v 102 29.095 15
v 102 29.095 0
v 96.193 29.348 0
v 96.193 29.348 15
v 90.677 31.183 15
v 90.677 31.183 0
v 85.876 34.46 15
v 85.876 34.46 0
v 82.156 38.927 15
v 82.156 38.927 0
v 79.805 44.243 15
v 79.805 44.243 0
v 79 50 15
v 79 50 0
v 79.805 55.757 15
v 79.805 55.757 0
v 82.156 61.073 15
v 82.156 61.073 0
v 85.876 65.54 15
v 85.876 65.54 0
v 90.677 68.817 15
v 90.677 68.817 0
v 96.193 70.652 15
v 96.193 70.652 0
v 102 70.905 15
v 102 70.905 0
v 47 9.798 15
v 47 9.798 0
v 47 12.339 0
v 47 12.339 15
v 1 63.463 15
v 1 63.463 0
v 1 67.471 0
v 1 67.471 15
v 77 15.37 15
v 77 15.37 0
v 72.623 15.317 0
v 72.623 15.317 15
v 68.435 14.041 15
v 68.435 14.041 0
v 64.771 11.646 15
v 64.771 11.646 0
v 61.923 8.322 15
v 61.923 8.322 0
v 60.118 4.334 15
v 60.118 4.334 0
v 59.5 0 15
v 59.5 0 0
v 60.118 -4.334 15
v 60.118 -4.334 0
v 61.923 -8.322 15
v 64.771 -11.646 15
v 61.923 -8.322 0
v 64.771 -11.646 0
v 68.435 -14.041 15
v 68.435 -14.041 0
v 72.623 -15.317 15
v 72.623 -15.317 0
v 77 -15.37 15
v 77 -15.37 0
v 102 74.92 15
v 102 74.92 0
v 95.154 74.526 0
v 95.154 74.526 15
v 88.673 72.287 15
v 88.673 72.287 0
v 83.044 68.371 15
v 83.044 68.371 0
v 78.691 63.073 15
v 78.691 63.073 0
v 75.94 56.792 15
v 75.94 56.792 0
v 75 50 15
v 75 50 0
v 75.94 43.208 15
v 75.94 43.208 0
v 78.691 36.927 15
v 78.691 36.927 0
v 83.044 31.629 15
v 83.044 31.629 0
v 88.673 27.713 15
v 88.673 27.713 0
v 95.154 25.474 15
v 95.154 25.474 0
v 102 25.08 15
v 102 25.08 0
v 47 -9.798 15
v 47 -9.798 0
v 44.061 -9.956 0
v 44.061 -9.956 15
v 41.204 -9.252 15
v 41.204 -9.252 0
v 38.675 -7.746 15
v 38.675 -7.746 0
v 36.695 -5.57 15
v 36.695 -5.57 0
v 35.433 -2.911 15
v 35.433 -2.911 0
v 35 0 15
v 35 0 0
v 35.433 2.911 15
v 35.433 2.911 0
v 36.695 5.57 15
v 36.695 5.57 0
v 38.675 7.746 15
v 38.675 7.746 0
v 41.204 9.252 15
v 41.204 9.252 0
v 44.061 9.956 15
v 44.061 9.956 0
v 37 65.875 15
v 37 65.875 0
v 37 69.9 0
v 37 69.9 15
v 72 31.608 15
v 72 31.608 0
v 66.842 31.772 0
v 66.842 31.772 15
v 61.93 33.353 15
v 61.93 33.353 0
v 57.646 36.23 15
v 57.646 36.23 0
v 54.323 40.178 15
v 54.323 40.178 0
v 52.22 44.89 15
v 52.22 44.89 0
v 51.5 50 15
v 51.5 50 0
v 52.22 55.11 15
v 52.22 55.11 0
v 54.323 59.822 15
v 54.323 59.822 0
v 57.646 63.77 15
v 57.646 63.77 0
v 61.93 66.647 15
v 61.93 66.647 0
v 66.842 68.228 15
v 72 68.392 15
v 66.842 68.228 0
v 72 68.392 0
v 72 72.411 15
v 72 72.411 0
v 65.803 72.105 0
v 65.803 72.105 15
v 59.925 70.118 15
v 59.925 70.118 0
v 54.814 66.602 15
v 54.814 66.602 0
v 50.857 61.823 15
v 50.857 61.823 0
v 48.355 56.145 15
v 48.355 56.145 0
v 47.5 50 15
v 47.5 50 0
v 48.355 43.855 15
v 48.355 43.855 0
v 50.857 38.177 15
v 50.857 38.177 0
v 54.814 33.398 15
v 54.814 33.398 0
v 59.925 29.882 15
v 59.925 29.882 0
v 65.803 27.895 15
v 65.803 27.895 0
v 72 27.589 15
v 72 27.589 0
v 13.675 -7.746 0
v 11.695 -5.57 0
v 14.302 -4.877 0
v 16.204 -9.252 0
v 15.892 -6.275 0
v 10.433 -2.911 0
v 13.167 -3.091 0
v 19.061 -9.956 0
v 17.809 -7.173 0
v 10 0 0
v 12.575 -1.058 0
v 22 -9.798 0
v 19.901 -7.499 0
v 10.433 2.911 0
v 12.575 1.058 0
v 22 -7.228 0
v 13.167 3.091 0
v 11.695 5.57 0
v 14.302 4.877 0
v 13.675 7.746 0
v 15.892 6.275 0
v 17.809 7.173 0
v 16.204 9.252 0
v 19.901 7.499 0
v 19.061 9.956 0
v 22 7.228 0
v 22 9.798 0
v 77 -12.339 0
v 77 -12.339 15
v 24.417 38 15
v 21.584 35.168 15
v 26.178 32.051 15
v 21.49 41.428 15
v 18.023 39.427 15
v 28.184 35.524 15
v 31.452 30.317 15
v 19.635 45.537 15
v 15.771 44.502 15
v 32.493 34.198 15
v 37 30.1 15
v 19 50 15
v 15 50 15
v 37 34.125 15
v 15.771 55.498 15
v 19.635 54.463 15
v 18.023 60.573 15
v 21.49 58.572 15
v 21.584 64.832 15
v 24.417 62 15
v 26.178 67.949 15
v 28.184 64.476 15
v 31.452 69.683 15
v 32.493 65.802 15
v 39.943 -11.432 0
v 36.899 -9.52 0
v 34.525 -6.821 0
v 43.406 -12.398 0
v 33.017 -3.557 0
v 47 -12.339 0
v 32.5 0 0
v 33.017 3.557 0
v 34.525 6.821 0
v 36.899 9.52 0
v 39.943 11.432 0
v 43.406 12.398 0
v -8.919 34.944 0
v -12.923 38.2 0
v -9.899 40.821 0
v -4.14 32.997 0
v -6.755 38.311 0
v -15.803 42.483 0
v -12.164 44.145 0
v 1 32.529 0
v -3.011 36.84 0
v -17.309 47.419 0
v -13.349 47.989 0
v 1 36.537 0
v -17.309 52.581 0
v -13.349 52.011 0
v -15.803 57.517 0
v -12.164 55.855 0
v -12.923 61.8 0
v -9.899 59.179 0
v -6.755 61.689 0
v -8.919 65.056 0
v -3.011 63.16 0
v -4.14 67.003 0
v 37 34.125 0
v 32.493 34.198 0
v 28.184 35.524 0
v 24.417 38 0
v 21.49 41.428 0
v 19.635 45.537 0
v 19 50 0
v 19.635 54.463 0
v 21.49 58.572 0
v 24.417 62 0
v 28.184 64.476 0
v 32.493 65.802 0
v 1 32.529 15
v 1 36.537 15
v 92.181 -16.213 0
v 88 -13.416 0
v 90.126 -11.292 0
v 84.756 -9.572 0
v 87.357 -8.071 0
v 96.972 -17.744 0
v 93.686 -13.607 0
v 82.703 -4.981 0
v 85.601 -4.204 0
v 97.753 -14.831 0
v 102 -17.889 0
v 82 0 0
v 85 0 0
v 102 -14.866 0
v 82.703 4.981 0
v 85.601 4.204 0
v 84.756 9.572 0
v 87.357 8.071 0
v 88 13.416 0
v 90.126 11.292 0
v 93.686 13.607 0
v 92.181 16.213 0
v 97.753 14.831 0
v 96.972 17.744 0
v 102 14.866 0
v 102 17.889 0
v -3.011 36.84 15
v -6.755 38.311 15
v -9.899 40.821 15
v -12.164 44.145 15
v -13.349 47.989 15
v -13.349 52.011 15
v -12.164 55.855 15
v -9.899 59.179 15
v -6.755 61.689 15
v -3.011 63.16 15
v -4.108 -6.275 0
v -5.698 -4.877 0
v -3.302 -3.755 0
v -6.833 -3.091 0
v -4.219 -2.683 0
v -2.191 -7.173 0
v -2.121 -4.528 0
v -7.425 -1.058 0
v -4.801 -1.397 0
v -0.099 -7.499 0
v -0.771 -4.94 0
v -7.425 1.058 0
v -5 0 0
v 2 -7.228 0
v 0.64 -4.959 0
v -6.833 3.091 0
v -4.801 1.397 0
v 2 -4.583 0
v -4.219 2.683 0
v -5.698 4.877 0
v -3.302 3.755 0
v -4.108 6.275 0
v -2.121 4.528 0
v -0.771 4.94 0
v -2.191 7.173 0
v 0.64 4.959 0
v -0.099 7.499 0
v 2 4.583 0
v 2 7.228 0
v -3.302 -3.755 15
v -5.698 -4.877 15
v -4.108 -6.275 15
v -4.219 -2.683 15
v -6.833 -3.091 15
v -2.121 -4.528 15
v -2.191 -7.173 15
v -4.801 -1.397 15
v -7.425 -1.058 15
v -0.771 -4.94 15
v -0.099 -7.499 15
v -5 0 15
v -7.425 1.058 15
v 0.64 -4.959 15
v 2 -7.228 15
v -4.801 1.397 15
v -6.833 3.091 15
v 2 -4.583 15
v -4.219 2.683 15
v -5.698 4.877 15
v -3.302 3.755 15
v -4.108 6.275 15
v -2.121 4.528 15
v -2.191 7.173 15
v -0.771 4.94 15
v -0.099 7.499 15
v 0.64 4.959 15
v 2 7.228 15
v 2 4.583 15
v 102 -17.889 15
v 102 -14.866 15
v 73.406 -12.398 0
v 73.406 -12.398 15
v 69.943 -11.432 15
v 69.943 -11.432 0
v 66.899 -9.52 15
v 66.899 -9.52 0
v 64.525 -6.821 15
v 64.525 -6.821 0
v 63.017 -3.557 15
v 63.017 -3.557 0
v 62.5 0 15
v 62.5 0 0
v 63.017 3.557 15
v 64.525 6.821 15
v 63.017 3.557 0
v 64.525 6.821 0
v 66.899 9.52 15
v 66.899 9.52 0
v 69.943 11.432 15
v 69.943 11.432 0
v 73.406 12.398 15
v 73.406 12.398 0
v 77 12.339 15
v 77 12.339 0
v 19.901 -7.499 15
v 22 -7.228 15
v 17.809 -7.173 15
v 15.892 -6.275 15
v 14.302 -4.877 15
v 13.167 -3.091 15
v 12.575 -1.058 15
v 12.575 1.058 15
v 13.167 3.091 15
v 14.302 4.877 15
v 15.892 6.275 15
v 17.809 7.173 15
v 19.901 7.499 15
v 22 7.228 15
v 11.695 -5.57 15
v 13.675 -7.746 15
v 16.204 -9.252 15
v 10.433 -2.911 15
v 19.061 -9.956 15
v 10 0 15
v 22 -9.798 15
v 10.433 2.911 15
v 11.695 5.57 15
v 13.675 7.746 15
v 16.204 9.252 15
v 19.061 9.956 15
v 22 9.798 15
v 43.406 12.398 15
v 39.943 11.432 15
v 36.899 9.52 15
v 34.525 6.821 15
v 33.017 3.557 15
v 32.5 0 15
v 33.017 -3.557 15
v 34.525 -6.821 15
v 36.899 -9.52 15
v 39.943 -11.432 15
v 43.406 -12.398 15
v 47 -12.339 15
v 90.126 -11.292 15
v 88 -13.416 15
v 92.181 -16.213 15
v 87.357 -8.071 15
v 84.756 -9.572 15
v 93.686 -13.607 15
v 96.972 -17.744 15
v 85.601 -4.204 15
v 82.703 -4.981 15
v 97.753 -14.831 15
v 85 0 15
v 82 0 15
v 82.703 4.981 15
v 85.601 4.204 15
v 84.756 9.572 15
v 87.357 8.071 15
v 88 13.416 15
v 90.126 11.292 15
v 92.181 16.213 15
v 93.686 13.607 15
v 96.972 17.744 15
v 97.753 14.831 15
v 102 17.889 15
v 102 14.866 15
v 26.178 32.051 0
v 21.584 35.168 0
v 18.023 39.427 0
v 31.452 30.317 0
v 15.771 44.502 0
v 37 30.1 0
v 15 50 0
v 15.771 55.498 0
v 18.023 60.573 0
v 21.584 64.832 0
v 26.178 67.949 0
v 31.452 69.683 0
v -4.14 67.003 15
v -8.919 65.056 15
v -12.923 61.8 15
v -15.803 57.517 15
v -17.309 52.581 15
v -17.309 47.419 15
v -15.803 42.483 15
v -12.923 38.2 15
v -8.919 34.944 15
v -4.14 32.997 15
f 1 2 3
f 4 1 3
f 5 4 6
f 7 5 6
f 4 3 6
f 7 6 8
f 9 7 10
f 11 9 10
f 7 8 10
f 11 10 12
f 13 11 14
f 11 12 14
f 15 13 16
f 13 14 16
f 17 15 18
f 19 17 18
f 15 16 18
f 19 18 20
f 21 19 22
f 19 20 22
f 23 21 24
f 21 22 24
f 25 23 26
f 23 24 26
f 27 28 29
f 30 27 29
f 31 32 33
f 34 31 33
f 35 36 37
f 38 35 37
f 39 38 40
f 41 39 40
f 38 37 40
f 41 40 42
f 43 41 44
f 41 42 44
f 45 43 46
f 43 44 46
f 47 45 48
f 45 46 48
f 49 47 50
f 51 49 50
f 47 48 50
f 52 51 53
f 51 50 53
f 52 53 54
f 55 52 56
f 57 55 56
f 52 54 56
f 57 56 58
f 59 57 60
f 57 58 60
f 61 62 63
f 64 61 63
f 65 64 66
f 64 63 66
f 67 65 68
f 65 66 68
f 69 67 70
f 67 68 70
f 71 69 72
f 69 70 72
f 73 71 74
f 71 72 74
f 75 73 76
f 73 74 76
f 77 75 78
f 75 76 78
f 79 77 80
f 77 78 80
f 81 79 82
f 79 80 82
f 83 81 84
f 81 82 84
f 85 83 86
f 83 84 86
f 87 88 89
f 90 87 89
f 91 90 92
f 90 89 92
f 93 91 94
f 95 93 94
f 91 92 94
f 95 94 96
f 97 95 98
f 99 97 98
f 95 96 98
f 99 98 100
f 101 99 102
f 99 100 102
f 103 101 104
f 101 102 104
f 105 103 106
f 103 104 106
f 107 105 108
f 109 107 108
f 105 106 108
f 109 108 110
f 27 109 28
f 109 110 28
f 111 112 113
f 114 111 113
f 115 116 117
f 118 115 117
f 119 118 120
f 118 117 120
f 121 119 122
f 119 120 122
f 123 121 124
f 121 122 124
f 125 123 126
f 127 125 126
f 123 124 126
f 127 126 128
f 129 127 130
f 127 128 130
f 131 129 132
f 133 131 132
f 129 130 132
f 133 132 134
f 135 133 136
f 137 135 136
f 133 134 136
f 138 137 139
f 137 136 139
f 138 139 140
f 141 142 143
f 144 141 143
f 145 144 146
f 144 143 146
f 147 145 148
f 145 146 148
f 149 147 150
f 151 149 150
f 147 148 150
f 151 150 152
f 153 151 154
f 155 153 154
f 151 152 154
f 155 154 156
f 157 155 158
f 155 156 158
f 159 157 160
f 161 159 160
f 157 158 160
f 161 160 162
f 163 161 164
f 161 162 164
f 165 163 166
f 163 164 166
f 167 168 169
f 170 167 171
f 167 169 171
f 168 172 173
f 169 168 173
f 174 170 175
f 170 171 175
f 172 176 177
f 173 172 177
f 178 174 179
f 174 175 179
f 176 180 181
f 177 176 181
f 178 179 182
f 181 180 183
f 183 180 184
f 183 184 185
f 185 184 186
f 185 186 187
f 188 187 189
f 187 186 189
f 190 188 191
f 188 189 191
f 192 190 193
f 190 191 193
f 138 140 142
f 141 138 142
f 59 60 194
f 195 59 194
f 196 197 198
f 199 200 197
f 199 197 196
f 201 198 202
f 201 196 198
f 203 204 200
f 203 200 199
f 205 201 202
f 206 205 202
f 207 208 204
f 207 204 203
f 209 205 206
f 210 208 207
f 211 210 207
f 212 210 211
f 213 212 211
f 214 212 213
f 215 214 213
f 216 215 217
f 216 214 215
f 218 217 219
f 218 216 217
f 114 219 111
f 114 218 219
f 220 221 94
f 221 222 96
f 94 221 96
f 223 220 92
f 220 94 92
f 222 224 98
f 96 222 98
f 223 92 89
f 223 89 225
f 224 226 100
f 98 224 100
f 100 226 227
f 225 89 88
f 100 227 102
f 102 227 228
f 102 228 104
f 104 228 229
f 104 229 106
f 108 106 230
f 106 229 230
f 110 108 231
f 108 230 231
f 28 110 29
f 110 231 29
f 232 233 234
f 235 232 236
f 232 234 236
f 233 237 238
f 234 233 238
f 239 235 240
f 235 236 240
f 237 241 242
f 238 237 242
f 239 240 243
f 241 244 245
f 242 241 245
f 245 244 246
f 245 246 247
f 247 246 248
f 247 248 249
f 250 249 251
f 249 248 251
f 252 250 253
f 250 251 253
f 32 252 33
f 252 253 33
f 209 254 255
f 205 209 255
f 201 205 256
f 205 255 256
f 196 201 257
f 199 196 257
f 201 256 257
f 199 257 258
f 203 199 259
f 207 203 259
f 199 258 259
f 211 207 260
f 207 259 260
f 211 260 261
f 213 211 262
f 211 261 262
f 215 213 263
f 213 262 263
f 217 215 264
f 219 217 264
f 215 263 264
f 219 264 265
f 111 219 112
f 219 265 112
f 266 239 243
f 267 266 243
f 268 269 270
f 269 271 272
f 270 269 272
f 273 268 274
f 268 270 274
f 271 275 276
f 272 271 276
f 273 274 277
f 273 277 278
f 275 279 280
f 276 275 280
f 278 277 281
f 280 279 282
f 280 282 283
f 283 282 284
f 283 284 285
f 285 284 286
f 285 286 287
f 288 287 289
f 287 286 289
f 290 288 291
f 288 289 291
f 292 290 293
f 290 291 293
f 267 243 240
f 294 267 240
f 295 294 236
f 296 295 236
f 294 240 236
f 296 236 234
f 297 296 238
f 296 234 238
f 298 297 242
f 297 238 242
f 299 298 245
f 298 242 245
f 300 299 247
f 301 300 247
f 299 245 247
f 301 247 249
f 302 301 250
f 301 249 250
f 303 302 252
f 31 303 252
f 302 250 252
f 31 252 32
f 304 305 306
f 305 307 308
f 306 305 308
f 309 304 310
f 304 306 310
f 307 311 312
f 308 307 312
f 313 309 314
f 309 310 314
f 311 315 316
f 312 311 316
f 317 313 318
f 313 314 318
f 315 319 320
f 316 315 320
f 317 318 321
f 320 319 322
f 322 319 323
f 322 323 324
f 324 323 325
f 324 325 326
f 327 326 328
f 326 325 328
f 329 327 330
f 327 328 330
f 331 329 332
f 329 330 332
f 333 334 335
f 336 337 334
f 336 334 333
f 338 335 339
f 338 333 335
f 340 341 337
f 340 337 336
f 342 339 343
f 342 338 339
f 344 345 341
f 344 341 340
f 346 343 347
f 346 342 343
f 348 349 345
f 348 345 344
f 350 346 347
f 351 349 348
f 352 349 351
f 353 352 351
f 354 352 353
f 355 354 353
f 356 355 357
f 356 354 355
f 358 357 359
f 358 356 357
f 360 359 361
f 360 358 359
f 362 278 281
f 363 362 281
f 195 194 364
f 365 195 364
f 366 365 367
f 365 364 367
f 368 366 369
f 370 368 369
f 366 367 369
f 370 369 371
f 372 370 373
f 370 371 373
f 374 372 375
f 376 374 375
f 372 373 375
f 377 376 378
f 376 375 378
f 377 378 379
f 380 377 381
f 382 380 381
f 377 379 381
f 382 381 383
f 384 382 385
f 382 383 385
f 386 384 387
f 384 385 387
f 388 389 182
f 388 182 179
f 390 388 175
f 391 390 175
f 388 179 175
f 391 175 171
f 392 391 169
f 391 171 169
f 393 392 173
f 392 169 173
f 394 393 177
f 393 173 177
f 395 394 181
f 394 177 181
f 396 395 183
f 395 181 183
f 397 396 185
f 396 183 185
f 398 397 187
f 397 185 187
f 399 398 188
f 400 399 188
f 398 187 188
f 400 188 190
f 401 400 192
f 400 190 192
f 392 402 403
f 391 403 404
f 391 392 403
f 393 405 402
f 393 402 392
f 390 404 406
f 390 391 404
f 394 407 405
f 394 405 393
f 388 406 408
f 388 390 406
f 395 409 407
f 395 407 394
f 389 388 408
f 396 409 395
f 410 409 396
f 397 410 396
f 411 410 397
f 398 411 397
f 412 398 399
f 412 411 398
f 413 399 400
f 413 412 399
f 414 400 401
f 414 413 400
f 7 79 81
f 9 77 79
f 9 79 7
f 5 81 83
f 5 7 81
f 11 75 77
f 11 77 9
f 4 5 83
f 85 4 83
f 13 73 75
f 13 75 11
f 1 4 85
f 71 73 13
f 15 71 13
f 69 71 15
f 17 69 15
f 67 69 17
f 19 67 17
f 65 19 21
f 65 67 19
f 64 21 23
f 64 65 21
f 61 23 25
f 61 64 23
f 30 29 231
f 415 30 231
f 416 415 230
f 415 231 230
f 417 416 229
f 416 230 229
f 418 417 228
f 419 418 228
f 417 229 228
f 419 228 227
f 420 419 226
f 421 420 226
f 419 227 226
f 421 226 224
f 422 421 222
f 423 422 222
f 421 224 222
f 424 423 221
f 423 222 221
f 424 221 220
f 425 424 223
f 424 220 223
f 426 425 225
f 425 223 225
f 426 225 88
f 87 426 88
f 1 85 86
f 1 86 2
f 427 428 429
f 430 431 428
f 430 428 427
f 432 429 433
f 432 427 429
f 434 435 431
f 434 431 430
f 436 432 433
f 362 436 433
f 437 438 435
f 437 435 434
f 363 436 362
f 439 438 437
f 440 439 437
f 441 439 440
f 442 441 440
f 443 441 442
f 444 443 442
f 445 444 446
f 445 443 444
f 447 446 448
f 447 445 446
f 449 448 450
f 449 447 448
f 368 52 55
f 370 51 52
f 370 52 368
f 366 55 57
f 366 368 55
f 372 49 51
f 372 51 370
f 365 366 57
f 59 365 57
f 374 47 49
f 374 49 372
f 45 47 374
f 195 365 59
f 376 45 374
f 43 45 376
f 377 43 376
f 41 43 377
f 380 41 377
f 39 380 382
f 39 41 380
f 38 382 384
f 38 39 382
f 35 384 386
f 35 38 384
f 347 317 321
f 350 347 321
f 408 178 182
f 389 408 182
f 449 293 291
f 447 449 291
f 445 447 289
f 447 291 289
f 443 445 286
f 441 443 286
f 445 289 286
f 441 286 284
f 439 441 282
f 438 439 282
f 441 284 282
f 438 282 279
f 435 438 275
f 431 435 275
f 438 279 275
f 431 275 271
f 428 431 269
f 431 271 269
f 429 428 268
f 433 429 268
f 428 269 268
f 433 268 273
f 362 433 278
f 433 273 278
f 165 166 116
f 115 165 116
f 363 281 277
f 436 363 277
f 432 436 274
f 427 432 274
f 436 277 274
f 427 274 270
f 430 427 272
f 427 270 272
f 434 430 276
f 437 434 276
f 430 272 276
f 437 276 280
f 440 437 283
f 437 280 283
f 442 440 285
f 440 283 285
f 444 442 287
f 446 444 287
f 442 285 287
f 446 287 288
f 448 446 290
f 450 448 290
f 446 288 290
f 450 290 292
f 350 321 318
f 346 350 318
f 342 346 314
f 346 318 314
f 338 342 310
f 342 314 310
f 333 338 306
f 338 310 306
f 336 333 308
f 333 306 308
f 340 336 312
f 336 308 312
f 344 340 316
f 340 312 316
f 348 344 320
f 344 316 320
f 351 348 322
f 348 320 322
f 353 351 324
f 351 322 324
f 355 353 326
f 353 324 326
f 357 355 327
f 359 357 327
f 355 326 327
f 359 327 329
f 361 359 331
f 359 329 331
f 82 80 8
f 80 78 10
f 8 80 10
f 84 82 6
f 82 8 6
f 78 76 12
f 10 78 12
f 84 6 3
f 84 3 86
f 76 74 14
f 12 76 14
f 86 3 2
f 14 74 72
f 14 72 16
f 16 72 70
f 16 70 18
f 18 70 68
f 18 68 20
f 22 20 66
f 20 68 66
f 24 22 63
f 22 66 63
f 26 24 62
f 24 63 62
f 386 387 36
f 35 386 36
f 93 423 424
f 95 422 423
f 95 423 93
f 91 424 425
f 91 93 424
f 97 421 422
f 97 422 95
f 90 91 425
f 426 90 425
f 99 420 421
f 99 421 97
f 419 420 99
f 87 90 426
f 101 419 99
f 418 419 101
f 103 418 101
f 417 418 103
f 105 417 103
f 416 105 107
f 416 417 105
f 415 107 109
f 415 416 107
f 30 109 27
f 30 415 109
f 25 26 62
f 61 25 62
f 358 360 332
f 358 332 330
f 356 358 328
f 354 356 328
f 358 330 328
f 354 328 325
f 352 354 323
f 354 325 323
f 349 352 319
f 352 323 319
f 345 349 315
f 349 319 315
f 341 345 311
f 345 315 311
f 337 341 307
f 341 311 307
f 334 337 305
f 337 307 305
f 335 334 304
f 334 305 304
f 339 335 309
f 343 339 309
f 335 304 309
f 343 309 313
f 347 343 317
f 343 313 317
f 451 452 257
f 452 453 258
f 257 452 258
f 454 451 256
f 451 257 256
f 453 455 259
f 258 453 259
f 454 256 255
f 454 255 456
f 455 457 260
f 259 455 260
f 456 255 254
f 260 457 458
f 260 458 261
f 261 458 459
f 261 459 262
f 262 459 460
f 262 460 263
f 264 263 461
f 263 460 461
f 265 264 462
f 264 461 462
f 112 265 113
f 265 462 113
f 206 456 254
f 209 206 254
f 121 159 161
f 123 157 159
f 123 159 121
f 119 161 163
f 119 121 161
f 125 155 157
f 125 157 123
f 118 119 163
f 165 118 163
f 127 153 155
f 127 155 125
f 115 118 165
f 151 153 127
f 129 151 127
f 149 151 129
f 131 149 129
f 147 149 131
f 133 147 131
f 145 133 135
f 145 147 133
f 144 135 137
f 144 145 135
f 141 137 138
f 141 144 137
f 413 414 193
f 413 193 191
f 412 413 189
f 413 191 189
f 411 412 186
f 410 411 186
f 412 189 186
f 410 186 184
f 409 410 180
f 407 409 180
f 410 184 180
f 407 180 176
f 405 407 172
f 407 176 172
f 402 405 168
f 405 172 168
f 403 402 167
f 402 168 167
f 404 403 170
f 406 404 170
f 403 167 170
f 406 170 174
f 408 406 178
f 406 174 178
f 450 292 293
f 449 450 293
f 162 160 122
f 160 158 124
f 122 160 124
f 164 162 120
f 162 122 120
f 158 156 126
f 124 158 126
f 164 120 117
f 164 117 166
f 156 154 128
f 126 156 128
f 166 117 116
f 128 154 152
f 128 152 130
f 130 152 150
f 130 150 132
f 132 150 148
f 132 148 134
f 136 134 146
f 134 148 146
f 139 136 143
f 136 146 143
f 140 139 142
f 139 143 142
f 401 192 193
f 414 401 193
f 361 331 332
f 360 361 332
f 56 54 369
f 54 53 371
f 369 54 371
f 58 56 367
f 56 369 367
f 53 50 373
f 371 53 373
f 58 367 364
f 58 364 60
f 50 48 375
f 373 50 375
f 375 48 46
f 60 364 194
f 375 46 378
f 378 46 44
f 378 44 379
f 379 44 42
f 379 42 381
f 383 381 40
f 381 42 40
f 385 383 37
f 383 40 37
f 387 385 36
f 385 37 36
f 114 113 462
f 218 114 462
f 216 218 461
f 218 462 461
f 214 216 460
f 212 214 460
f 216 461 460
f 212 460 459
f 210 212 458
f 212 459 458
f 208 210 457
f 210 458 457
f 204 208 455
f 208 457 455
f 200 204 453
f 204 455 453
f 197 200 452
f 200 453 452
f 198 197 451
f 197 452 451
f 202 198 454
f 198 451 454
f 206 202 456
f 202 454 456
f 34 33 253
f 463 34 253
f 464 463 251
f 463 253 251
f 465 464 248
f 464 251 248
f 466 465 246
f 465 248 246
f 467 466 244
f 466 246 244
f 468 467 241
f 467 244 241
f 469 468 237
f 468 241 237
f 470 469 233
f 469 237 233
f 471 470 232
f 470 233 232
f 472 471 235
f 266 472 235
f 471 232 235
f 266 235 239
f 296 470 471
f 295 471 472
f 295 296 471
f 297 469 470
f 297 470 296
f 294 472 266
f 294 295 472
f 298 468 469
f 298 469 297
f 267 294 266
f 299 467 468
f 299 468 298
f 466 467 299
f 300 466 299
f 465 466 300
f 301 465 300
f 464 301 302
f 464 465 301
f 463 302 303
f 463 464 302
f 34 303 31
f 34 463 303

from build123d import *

# Parameters (mm, degrees)
F1_DEPTH = 15


with BuildPart() as f1:
    # F0 (on Top) → F1 (new body)
    with BuildSketch(Plane.XY):
        with BuildLine():
            ThreePointArc((2, -4.582576), (-5, 0), (2, 4.582576))
            Line((2, 4.582576), (2, 7.228416))
            ThreePointArc((2, 7.228416), (-7.5, 0), (2, -7.228416))
            Line((2, -7.228416), (2, -4.582576))
        make_face()
        with BuildLine():
            ThreePointArc((22, -7.228416), (12.5, 0), (22, 7.228416))
            Line((22, 7.228416), (22, 9.797959))
            ThreePointArc((22, 9.797959), (10, 0), (22, -9.797959))
            Line((22, -9.797959), (22, -7.228416))
        make_face()
        with BuildLine():
            ThreePointArc((47, -9.797959), (35, 0), (47, 9.797959))
            Line((47, 9.797959), (47, 12.338963))
            ThreePointArc((47, 12.338963), (32.5, 0), (47, -12.338963))
            Line((47, -12.338963), (47, -9.797959))
        make_face()
        with BuildLine():
            ThreePointArc((77, -12.338963), (62.5, 0), (77, 12.338963))
            Line((77, 12.338963), (77, 15.370426))
            ThreePointArc((77, 15.370426), (59.5, 0), (77, -15.370426))
            Line((77, -15.370426), (77, -12.338963))
        make_face()
        with BuildLine():
            Line((1, 63.462912), (1, 67.471405))
            ThreePointArc((1, 67.471405), (-17.5, 50), (1, 32.528595))
            Line((1, 32.528595), (1, 36.537088))
            ThreePointArc((1, 36.537088), (-13.5, 50), (1, 63.462912))
        make_face()
        with BuildLine():
            Line((37, 65.874508), (37, 69.899749))
            ThreePointArc((37, 69.899749), (15, 50), (37, 30.100251))
            Line((37, 30.100251), (37, 34.125492))
            ThreePointArc((37, 34.125492), (19, 50), (37, 65.874508))
        make_face()
        with BuildLine():
            Line((72, 68.391574), (72, 72.410935))
            ThreePointArc((72, 72.410935), (47.5, 50), (72, 27.589065))
            Line((72, 27.589065), (72, 31.608426))
            ThreePointArc((72, 31.608426), (51.5, 50), (72, 68.391574))
        make_face()
        with BuildLine():
            Line((102, 14.866069), (102, 17.888544))
            ThreePointArc((102, 17.888544), (82, 0), (102, -17.888544))
            Line((102, -17.888544), (102, -14.866069))
            ThreePointArc((102, -14.866069), (85, 0), (102, 14.866069))
        make_face()
        with BuildLine():
            Line((102, 70.904545), (102, 74.919872))
            ThreePointArc((102, 74.919872), (75, 50), (102, 25.080128))
            Line((102, 25.080128), (102, 29.095455))
            ThreePointArc((102, 29.095455), (79, 50), (102, 70.904545))
        make_face()
    extrude(amount=F1_DEPTH)


solid = f1.part
